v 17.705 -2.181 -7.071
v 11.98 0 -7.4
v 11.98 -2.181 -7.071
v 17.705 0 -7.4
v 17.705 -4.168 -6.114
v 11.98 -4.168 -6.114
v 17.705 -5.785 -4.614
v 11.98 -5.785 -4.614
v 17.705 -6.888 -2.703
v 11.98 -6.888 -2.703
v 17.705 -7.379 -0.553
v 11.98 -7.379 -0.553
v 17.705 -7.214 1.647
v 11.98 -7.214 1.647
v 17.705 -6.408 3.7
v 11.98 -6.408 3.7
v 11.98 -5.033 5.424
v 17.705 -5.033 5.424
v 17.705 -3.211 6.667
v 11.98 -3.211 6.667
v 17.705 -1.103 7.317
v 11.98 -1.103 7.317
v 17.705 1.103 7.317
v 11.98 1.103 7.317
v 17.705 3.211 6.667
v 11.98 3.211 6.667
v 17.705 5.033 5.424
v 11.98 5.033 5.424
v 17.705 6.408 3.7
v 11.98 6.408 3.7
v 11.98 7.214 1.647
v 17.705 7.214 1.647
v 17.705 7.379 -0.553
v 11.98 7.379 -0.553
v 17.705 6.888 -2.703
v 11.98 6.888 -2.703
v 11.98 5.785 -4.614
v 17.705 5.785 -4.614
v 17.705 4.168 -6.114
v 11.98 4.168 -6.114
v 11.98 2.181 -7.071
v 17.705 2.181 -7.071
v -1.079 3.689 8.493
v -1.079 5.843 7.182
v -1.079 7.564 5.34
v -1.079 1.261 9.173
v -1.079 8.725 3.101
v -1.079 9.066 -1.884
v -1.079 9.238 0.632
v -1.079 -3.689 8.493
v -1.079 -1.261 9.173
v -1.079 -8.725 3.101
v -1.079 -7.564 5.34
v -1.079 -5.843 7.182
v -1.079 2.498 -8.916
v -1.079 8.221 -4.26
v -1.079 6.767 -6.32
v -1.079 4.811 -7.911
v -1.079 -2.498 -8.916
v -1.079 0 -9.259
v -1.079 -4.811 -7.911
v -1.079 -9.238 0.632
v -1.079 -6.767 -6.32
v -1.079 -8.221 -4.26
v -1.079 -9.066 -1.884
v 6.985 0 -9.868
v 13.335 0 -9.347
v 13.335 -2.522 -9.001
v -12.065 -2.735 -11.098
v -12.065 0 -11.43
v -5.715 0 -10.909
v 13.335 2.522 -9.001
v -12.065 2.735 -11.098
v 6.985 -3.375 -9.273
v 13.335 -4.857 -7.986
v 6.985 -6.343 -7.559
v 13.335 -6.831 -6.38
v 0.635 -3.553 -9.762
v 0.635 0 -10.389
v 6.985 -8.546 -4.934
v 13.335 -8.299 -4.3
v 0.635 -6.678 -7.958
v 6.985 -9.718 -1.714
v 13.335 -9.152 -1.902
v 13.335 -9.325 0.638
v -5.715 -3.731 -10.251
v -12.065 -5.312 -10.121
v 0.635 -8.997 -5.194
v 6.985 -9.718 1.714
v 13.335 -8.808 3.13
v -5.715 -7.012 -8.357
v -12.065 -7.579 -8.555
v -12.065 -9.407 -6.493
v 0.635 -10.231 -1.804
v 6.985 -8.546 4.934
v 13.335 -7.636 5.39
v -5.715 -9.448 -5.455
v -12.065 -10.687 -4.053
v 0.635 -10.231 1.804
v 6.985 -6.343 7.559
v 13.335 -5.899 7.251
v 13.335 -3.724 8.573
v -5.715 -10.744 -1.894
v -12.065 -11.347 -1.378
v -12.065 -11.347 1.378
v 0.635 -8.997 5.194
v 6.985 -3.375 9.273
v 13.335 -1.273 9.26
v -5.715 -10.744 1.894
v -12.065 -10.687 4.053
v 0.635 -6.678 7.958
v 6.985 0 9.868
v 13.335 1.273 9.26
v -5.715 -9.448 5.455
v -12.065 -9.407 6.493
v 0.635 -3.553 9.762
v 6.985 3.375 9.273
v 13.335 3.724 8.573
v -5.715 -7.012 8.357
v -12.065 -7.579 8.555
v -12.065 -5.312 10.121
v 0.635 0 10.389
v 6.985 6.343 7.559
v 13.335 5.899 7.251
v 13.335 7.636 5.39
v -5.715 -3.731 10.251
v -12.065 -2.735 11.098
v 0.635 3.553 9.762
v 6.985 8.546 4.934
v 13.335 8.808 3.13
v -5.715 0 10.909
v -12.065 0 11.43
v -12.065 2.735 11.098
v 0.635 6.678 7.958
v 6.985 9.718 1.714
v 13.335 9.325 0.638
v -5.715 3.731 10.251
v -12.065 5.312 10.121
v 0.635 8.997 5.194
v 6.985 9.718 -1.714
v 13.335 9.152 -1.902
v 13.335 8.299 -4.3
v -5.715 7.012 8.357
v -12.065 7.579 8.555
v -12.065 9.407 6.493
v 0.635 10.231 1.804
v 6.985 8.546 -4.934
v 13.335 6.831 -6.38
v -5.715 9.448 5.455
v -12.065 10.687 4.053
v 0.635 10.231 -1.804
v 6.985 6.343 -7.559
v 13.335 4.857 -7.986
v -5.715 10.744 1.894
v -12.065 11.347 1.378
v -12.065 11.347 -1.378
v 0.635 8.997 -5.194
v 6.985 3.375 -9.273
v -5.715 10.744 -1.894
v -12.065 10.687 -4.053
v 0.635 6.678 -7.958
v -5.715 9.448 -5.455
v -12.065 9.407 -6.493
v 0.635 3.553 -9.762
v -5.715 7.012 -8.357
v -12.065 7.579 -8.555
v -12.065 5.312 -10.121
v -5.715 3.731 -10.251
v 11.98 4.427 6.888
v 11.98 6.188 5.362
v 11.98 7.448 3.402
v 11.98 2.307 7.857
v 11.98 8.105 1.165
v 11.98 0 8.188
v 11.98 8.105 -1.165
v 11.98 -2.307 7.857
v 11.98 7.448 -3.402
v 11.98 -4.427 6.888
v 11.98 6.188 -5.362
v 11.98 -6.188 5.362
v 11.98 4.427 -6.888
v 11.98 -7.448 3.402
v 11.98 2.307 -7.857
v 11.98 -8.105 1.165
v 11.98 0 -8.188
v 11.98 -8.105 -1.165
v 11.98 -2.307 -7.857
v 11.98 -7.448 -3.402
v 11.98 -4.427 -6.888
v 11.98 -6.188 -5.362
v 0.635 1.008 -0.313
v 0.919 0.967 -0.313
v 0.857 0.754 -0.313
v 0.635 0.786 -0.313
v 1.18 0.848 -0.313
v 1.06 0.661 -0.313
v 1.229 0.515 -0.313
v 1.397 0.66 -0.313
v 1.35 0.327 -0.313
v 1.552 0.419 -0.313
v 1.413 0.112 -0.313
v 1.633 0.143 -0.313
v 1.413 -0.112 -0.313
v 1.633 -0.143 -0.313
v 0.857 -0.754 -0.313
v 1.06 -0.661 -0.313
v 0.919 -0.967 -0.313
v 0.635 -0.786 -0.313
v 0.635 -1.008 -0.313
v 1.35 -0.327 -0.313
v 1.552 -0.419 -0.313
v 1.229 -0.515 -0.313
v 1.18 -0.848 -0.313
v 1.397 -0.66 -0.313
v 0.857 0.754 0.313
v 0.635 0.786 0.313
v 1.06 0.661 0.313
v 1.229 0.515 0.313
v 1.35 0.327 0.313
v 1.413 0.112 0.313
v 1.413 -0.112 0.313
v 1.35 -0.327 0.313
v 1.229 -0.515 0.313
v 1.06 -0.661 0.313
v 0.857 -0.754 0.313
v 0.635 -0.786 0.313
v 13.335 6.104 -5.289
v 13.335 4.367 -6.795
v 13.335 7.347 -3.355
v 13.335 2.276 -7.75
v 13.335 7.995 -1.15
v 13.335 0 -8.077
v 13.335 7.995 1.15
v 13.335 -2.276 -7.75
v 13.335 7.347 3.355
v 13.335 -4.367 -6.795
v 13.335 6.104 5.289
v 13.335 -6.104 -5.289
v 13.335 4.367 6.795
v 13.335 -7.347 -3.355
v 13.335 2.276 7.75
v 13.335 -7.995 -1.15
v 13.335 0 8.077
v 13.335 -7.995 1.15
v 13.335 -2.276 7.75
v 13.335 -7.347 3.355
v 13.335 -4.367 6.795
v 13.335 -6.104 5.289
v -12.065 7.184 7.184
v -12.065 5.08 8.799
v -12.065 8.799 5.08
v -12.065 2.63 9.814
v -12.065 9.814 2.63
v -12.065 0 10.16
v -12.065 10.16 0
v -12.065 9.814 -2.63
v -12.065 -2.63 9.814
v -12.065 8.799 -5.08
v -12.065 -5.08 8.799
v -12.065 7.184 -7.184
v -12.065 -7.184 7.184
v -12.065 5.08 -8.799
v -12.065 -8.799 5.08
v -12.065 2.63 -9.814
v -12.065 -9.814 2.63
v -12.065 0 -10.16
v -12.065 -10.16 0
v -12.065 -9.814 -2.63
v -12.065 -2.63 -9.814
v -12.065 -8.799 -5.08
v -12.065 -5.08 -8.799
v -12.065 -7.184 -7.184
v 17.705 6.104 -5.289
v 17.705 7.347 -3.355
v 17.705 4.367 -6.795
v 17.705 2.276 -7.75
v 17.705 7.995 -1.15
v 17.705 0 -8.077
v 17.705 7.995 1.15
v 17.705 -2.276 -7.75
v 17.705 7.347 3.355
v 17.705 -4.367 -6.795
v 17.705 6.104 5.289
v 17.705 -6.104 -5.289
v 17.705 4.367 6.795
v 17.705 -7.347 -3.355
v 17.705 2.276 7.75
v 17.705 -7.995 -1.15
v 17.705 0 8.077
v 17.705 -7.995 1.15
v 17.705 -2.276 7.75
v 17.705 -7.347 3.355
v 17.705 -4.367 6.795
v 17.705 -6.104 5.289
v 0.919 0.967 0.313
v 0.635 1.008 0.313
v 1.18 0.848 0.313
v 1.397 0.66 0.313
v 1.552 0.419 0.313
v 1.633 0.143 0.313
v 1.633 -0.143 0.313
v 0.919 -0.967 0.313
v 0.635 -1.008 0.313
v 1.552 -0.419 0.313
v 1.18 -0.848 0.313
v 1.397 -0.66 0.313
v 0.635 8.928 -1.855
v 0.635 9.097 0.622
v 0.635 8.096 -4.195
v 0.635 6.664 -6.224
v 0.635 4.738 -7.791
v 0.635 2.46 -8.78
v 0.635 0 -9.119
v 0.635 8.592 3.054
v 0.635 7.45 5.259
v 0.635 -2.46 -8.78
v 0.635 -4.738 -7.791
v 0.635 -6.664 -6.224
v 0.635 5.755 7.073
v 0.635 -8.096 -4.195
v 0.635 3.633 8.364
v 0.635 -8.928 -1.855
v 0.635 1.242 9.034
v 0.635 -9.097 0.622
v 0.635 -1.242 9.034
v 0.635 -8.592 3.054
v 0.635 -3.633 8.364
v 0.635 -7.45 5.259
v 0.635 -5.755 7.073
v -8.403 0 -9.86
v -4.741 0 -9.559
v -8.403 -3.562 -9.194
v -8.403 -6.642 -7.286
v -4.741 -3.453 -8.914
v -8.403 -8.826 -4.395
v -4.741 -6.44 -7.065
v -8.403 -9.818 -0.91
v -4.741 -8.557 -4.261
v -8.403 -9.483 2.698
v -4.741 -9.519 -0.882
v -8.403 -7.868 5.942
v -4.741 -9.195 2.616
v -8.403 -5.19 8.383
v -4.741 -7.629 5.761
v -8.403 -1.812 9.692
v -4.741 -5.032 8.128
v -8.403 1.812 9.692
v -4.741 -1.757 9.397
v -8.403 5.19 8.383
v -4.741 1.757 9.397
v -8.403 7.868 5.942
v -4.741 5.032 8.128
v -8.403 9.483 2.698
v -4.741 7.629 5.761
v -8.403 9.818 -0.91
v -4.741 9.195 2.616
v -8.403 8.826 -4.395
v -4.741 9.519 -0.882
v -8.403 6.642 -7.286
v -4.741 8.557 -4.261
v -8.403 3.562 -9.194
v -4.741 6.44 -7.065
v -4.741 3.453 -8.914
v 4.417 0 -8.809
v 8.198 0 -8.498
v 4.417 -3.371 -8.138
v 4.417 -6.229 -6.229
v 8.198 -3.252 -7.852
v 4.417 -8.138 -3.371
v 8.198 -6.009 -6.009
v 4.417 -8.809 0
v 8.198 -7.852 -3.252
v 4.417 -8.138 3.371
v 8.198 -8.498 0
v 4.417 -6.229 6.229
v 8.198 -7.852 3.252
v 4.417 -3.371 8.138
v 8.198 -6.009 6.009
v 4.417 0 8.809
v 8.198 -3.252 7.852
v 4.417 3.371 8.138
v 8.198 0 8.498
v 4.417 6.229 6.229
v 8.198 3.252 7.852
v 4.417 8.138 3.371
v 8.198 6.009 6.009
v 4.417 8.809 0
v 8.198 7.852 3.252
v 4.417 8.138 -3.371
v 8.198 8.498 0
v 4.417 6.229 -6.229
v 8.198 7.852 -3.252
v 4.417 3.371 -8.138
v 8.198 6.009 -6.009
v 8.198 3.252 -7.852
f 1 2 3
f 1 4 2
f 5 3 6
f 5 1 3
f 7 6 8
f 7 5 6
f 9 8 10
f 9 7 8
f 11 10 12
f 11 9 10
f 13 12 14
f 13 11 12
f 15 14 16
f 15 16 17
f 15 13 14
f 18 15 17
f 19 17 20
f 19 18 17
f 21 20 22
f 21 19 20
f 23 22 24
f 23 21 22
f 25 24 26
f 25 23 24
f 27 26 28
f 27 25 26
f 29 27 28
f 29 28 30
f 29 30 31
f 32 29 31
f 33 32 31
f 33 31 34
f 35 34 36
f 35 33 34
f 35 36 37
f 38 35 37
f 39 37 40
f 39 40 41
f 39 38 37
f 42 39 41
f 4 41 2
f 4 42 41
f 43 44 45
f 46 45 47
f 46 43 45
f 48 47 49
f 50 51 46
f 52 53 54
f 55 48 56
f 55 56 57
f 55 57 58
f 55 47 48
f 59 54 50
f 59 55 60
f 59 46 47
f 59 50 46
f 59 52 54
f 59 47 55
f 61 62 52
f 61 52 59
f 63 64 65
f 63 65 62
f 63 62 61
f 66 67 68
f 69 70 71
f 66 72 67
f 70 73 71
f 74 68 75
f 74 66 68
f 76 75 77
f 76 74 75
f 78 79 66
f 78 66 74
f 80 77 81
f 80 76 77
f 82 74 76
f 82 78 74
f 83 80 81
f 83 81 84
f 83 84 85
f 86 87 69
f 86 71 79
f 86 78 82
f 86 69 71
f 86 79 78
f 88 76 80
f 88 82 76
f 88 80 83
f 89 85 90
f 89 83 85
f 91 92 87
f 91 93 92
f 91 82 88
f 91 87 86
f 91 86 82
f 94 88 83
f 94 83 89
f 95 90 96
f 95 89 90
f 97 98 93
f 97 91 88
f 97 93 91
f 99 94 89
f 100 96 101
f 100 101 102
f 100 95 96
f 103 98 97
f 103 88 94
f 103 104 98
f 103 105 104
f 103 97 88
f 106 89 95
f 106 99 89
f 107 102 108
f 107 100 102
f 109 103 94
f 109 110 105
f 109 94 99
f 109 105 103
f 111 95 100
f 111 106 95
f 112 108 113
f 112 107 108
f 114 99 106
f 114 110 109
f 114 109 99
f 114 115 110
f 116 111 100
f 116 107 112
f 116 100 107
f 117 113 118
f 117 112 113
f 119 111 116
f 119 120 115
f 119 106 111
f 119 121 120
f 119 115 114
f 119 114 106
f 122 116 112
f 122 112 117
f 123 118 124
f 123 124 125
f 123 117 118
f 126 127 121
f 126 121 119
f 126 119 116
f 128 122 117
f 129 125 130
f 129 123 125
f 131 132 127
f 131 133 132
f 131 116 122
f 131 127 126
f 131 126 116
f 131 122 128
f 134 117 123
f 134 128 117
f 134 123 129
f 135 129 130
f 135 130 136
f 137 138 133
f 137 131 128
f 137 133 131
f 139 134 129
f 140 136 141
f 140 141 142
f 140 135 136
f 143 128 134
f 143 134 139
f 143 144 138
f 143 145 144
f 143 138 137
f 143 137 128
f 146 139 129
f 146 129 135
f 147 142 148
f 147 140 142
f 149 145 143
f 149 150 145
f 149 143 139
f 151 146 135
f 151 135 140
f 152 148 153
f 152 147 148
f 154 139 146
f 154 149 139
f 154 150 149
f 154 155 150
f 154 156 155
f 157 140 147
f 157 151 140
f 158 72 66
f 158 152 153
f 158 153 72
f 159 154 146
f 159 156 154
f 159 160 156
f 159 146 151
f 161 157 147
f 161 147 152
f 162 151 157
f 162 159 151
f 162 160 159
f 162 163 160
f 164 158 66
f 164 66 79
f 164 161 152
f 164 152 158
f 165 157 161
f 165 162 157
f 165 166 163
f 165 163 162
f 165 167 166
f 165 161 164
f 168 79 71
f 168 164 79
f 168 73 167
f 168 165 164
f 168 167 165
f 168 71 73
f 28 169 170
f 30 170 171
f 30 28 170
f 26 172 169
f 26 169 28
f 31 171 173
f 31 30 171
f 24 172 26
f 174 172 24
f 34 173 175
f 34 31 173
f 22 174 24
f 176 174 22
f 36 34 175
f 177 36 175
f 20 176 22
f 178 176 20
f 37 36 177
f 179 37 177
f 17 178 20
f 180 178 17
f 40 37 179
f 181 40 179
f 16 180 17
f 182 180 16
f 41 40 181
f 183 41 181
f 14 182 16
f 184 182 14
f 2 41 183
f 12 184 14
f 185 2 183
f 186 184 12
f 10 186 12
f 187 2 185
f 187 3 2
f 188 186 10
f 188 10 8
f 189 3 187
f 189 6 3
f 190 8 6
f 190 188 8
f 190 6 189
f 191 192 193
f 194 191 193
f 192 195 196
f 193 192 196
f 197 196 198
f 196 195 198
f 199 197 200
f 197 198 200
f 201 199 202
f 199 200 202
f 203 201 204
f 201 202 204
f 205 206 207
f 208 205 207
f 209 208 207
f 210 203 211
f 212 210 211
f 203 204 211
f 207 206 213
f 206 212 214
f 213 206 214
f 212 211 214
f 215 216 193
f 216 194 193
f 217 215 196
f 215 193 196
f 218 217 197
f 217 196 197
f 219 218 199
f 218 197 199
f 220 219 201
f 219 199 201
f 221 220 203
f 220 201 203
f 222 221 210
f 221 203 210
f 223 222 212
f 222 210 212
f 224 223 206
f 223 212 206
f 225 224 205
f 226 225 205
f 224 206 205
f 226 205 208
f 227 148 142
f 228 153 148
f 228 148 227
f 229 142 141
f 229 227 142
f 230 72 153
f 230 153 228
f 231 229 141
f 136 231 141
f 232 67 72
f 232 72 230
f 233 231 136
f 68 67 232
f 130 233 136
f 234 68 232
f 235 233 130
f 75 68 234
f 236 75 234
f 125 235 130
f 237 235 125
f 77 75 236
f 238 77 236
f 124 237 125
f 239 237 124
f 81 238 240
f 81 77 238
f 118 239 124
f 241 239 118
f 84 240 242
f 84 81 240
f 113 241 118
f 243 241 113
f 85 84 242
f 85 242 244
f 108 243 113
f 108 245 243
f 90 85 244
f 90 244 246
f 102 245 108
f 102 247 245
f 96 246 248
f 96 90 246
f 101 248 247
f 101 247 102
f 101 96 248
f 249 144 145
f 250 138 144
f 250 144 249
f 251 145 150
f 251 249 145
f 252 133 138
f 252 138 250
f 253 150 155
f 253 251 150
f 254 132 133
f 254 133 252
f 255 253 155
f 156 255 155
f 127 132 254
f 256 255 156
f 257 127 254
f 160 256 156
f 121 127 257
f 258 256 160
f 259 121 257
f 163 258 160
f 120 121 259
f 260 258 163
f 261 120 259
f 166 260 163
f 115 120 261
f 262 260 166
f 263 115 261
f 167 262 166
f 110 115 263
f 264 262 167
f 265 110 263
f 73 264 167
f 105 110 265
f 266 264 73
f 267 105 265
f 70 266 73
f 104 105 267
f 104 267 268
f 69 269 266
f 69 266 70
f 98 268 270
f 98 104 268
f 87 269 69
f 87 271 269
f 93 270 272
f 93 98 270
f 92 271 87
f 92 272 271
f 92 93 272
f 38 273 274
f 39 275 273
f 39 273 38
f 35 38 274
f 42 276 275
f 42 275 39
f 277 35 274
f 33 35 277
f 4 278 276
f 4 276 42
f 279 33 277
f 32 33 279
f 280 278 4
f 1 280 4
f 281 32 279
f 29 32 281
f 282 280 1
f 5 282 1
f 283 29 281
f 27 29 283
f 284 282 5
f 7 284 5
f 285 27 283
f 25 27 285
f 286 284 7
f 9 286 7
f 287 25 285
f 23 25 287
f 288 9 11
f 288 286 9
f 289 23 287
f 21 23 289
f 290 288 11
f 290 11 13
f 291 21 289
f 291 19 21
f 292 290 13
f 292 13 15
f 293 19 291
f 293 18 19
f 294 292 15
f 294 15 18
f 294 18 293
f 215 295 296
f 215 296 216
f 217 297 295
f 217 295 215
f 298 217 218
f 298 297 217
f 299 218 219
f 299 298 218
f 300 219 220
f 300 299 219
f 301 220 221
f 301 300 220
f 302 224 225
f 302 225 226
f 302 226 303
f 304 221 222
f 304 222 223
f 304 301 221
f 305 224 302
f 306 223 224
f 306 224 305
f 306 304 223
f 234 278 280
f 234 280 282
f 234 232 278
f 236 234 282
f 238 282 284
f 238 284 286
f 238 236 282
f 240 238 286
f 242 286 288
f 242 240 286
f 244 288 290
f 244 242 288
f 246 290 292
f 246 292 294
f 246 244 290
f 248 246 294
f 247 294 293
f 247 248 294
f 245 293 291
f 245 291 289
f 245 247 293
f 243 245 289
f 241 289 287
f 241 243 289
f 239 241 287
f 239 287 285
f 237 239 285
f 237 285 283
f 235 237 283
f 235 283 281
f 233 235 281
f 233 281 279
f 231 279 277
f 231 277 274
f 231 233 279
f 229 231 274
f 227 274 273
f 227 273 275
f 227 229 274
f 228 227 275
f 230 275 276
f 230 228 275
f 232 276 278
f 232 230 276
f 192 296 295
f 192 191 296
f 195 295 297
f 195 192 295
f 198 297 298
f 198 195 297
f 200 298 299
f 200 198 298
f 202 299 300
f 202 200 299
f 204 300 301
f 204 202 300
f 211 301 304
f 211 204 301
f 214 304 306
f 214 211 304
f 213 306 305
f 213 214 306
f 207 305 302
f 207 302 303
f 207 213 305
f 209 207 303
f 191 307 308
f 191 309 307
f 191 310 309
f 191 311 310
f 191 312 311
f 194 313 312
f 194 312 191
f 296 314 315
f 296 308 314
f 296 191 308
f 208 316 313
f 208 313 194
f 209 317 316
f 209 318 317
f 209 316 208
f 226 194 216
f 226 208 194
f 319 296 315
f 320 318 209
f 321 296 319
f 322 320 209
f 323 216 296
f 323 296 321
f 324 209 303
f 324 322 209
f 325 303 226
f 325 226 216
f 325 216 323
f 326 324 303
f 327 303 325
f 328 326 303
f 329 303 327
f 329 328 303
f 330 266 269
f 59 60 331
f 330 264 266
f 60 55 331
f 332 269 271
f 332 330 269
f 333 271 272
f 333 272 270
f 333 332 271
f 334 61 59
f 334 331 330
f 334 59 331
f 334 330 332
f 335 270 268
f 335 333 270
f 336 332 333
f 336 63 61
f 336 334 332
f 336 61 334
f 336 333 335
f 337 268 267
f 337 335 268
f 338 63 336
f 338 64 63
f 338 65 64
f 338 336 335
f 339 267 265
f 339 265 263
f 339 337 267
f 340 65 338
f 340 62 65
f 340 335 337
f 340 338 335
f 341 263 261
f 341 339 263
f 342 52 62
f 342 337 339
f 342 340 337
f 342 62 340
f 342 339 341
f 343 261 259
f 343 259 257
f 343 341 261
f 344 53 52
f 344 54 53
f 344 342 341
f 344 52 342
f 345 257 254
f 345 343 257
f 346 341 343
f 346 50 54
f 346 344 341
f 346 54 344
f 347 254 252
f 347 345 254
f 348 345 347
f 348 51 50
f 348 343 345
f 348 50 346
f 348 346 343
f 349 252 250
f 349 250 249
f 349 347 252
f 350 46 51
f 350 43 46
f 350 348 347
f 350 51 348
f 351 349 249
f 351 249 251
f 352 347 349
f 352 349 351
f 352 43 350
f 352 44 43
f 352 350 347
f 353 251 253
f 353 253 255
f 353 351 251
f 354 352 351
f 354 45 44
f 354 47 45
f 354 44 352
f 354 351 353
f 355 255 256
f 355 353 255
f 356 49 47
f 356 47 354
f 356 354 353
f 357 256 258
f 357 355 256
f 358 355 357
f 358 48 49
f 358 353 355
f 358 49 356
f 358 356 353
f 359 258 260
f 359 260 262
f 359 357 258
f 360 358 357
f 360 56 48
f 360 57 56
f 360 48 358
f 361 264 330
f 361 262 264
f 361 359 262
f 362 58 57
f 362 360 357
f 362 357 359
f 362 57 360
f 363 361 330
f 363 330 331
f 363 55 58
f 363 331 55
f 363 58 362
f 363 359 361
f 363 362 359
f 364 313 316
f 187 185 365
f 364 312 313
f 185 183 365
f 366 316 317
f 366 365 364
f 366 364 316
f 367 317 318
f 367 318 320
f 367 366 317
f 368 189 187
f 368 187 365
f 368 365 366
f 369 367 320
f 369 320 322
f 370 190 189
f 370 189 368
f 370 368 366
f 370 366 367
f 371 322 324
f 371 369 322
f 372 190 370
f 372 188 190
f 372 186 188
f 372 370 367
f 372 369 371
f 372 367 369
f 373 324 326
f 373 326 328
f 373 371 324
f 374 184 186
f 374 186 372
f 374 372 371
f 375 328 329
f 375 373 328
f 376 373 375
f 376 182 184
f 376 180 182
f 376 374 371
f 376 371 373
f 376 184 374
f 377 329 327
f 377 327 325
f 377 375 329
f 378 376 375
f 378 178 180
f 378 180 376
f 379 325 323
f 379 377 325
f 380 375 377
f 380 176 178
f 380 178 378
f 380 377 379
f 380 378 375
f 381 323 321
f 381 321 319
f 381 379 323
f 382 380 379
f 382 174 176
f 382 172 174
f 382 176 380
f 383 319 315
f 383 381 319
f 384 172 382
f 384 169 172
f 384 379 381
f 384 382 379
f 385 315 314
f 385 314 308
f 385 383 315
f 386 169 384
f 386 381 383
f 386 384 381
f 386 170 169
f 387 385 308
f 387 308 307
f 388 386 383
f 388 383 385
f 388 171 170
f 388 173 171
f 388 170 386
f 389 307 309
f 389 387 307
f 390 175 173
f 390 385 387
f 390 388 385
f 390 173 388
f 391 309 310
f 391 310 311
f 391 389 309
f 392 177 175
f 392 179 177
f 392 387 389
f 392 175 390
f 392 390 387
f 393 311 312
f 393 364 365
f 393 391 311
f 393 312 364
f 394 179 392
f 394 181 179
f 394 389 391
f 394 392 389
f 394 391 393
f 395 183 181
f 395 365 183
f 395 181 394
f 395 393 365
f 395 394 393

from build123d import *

# Parameters (mm, degrees)
SKETCH2_W      = 0.625748312
SKETCH2_H      = 0.221900722
REVOLVE5_ANGLE = 180


with BuildPart() as part:
    # Sketch1 → Revolve4 (revolve)
    with BuildSketch(Plane.XY, mode=Mode.PRIVATE) as revolve4_sk:
        Polygon((-12.065, 11.43), (-12.065, 10.16), (-1.079269363, 9.259170088), (-1.079269363, 0), (0.635, 0), (0.635, 9.1186), (11.979982671, 8.188311421), (11.979982671, 7.399559782), (17.704559016, 7.399559782), (17.704559016, 8.0772), (13.335, 8.0772), (13.335, 9.3472), align=None)
    revolve(revolve4_sk.sketch.rotate(Axis((44.726440805, 0, 0), (-1, 0, 0)), 90), axis=Axis((44.726440805, 0, 0), (-1, 0, 0)))

    # Sketch2 → Revolve5 (revolve)
    with BuildSketch(Plane(origin=(0.635, 0, 0), x_dir=(0, 0, -1), z_dir=(1, 0, 0))):
        with Locations((0, 0.897225516)):
            Rectangle(SKETCH2_W, SKETCH2_H)
    revolve(axis=Axis((0.635, 0, 0.312874156), (0, 0, -1)), revolution_arc=REVOLVE5_ANGLE)


solid = part.part
